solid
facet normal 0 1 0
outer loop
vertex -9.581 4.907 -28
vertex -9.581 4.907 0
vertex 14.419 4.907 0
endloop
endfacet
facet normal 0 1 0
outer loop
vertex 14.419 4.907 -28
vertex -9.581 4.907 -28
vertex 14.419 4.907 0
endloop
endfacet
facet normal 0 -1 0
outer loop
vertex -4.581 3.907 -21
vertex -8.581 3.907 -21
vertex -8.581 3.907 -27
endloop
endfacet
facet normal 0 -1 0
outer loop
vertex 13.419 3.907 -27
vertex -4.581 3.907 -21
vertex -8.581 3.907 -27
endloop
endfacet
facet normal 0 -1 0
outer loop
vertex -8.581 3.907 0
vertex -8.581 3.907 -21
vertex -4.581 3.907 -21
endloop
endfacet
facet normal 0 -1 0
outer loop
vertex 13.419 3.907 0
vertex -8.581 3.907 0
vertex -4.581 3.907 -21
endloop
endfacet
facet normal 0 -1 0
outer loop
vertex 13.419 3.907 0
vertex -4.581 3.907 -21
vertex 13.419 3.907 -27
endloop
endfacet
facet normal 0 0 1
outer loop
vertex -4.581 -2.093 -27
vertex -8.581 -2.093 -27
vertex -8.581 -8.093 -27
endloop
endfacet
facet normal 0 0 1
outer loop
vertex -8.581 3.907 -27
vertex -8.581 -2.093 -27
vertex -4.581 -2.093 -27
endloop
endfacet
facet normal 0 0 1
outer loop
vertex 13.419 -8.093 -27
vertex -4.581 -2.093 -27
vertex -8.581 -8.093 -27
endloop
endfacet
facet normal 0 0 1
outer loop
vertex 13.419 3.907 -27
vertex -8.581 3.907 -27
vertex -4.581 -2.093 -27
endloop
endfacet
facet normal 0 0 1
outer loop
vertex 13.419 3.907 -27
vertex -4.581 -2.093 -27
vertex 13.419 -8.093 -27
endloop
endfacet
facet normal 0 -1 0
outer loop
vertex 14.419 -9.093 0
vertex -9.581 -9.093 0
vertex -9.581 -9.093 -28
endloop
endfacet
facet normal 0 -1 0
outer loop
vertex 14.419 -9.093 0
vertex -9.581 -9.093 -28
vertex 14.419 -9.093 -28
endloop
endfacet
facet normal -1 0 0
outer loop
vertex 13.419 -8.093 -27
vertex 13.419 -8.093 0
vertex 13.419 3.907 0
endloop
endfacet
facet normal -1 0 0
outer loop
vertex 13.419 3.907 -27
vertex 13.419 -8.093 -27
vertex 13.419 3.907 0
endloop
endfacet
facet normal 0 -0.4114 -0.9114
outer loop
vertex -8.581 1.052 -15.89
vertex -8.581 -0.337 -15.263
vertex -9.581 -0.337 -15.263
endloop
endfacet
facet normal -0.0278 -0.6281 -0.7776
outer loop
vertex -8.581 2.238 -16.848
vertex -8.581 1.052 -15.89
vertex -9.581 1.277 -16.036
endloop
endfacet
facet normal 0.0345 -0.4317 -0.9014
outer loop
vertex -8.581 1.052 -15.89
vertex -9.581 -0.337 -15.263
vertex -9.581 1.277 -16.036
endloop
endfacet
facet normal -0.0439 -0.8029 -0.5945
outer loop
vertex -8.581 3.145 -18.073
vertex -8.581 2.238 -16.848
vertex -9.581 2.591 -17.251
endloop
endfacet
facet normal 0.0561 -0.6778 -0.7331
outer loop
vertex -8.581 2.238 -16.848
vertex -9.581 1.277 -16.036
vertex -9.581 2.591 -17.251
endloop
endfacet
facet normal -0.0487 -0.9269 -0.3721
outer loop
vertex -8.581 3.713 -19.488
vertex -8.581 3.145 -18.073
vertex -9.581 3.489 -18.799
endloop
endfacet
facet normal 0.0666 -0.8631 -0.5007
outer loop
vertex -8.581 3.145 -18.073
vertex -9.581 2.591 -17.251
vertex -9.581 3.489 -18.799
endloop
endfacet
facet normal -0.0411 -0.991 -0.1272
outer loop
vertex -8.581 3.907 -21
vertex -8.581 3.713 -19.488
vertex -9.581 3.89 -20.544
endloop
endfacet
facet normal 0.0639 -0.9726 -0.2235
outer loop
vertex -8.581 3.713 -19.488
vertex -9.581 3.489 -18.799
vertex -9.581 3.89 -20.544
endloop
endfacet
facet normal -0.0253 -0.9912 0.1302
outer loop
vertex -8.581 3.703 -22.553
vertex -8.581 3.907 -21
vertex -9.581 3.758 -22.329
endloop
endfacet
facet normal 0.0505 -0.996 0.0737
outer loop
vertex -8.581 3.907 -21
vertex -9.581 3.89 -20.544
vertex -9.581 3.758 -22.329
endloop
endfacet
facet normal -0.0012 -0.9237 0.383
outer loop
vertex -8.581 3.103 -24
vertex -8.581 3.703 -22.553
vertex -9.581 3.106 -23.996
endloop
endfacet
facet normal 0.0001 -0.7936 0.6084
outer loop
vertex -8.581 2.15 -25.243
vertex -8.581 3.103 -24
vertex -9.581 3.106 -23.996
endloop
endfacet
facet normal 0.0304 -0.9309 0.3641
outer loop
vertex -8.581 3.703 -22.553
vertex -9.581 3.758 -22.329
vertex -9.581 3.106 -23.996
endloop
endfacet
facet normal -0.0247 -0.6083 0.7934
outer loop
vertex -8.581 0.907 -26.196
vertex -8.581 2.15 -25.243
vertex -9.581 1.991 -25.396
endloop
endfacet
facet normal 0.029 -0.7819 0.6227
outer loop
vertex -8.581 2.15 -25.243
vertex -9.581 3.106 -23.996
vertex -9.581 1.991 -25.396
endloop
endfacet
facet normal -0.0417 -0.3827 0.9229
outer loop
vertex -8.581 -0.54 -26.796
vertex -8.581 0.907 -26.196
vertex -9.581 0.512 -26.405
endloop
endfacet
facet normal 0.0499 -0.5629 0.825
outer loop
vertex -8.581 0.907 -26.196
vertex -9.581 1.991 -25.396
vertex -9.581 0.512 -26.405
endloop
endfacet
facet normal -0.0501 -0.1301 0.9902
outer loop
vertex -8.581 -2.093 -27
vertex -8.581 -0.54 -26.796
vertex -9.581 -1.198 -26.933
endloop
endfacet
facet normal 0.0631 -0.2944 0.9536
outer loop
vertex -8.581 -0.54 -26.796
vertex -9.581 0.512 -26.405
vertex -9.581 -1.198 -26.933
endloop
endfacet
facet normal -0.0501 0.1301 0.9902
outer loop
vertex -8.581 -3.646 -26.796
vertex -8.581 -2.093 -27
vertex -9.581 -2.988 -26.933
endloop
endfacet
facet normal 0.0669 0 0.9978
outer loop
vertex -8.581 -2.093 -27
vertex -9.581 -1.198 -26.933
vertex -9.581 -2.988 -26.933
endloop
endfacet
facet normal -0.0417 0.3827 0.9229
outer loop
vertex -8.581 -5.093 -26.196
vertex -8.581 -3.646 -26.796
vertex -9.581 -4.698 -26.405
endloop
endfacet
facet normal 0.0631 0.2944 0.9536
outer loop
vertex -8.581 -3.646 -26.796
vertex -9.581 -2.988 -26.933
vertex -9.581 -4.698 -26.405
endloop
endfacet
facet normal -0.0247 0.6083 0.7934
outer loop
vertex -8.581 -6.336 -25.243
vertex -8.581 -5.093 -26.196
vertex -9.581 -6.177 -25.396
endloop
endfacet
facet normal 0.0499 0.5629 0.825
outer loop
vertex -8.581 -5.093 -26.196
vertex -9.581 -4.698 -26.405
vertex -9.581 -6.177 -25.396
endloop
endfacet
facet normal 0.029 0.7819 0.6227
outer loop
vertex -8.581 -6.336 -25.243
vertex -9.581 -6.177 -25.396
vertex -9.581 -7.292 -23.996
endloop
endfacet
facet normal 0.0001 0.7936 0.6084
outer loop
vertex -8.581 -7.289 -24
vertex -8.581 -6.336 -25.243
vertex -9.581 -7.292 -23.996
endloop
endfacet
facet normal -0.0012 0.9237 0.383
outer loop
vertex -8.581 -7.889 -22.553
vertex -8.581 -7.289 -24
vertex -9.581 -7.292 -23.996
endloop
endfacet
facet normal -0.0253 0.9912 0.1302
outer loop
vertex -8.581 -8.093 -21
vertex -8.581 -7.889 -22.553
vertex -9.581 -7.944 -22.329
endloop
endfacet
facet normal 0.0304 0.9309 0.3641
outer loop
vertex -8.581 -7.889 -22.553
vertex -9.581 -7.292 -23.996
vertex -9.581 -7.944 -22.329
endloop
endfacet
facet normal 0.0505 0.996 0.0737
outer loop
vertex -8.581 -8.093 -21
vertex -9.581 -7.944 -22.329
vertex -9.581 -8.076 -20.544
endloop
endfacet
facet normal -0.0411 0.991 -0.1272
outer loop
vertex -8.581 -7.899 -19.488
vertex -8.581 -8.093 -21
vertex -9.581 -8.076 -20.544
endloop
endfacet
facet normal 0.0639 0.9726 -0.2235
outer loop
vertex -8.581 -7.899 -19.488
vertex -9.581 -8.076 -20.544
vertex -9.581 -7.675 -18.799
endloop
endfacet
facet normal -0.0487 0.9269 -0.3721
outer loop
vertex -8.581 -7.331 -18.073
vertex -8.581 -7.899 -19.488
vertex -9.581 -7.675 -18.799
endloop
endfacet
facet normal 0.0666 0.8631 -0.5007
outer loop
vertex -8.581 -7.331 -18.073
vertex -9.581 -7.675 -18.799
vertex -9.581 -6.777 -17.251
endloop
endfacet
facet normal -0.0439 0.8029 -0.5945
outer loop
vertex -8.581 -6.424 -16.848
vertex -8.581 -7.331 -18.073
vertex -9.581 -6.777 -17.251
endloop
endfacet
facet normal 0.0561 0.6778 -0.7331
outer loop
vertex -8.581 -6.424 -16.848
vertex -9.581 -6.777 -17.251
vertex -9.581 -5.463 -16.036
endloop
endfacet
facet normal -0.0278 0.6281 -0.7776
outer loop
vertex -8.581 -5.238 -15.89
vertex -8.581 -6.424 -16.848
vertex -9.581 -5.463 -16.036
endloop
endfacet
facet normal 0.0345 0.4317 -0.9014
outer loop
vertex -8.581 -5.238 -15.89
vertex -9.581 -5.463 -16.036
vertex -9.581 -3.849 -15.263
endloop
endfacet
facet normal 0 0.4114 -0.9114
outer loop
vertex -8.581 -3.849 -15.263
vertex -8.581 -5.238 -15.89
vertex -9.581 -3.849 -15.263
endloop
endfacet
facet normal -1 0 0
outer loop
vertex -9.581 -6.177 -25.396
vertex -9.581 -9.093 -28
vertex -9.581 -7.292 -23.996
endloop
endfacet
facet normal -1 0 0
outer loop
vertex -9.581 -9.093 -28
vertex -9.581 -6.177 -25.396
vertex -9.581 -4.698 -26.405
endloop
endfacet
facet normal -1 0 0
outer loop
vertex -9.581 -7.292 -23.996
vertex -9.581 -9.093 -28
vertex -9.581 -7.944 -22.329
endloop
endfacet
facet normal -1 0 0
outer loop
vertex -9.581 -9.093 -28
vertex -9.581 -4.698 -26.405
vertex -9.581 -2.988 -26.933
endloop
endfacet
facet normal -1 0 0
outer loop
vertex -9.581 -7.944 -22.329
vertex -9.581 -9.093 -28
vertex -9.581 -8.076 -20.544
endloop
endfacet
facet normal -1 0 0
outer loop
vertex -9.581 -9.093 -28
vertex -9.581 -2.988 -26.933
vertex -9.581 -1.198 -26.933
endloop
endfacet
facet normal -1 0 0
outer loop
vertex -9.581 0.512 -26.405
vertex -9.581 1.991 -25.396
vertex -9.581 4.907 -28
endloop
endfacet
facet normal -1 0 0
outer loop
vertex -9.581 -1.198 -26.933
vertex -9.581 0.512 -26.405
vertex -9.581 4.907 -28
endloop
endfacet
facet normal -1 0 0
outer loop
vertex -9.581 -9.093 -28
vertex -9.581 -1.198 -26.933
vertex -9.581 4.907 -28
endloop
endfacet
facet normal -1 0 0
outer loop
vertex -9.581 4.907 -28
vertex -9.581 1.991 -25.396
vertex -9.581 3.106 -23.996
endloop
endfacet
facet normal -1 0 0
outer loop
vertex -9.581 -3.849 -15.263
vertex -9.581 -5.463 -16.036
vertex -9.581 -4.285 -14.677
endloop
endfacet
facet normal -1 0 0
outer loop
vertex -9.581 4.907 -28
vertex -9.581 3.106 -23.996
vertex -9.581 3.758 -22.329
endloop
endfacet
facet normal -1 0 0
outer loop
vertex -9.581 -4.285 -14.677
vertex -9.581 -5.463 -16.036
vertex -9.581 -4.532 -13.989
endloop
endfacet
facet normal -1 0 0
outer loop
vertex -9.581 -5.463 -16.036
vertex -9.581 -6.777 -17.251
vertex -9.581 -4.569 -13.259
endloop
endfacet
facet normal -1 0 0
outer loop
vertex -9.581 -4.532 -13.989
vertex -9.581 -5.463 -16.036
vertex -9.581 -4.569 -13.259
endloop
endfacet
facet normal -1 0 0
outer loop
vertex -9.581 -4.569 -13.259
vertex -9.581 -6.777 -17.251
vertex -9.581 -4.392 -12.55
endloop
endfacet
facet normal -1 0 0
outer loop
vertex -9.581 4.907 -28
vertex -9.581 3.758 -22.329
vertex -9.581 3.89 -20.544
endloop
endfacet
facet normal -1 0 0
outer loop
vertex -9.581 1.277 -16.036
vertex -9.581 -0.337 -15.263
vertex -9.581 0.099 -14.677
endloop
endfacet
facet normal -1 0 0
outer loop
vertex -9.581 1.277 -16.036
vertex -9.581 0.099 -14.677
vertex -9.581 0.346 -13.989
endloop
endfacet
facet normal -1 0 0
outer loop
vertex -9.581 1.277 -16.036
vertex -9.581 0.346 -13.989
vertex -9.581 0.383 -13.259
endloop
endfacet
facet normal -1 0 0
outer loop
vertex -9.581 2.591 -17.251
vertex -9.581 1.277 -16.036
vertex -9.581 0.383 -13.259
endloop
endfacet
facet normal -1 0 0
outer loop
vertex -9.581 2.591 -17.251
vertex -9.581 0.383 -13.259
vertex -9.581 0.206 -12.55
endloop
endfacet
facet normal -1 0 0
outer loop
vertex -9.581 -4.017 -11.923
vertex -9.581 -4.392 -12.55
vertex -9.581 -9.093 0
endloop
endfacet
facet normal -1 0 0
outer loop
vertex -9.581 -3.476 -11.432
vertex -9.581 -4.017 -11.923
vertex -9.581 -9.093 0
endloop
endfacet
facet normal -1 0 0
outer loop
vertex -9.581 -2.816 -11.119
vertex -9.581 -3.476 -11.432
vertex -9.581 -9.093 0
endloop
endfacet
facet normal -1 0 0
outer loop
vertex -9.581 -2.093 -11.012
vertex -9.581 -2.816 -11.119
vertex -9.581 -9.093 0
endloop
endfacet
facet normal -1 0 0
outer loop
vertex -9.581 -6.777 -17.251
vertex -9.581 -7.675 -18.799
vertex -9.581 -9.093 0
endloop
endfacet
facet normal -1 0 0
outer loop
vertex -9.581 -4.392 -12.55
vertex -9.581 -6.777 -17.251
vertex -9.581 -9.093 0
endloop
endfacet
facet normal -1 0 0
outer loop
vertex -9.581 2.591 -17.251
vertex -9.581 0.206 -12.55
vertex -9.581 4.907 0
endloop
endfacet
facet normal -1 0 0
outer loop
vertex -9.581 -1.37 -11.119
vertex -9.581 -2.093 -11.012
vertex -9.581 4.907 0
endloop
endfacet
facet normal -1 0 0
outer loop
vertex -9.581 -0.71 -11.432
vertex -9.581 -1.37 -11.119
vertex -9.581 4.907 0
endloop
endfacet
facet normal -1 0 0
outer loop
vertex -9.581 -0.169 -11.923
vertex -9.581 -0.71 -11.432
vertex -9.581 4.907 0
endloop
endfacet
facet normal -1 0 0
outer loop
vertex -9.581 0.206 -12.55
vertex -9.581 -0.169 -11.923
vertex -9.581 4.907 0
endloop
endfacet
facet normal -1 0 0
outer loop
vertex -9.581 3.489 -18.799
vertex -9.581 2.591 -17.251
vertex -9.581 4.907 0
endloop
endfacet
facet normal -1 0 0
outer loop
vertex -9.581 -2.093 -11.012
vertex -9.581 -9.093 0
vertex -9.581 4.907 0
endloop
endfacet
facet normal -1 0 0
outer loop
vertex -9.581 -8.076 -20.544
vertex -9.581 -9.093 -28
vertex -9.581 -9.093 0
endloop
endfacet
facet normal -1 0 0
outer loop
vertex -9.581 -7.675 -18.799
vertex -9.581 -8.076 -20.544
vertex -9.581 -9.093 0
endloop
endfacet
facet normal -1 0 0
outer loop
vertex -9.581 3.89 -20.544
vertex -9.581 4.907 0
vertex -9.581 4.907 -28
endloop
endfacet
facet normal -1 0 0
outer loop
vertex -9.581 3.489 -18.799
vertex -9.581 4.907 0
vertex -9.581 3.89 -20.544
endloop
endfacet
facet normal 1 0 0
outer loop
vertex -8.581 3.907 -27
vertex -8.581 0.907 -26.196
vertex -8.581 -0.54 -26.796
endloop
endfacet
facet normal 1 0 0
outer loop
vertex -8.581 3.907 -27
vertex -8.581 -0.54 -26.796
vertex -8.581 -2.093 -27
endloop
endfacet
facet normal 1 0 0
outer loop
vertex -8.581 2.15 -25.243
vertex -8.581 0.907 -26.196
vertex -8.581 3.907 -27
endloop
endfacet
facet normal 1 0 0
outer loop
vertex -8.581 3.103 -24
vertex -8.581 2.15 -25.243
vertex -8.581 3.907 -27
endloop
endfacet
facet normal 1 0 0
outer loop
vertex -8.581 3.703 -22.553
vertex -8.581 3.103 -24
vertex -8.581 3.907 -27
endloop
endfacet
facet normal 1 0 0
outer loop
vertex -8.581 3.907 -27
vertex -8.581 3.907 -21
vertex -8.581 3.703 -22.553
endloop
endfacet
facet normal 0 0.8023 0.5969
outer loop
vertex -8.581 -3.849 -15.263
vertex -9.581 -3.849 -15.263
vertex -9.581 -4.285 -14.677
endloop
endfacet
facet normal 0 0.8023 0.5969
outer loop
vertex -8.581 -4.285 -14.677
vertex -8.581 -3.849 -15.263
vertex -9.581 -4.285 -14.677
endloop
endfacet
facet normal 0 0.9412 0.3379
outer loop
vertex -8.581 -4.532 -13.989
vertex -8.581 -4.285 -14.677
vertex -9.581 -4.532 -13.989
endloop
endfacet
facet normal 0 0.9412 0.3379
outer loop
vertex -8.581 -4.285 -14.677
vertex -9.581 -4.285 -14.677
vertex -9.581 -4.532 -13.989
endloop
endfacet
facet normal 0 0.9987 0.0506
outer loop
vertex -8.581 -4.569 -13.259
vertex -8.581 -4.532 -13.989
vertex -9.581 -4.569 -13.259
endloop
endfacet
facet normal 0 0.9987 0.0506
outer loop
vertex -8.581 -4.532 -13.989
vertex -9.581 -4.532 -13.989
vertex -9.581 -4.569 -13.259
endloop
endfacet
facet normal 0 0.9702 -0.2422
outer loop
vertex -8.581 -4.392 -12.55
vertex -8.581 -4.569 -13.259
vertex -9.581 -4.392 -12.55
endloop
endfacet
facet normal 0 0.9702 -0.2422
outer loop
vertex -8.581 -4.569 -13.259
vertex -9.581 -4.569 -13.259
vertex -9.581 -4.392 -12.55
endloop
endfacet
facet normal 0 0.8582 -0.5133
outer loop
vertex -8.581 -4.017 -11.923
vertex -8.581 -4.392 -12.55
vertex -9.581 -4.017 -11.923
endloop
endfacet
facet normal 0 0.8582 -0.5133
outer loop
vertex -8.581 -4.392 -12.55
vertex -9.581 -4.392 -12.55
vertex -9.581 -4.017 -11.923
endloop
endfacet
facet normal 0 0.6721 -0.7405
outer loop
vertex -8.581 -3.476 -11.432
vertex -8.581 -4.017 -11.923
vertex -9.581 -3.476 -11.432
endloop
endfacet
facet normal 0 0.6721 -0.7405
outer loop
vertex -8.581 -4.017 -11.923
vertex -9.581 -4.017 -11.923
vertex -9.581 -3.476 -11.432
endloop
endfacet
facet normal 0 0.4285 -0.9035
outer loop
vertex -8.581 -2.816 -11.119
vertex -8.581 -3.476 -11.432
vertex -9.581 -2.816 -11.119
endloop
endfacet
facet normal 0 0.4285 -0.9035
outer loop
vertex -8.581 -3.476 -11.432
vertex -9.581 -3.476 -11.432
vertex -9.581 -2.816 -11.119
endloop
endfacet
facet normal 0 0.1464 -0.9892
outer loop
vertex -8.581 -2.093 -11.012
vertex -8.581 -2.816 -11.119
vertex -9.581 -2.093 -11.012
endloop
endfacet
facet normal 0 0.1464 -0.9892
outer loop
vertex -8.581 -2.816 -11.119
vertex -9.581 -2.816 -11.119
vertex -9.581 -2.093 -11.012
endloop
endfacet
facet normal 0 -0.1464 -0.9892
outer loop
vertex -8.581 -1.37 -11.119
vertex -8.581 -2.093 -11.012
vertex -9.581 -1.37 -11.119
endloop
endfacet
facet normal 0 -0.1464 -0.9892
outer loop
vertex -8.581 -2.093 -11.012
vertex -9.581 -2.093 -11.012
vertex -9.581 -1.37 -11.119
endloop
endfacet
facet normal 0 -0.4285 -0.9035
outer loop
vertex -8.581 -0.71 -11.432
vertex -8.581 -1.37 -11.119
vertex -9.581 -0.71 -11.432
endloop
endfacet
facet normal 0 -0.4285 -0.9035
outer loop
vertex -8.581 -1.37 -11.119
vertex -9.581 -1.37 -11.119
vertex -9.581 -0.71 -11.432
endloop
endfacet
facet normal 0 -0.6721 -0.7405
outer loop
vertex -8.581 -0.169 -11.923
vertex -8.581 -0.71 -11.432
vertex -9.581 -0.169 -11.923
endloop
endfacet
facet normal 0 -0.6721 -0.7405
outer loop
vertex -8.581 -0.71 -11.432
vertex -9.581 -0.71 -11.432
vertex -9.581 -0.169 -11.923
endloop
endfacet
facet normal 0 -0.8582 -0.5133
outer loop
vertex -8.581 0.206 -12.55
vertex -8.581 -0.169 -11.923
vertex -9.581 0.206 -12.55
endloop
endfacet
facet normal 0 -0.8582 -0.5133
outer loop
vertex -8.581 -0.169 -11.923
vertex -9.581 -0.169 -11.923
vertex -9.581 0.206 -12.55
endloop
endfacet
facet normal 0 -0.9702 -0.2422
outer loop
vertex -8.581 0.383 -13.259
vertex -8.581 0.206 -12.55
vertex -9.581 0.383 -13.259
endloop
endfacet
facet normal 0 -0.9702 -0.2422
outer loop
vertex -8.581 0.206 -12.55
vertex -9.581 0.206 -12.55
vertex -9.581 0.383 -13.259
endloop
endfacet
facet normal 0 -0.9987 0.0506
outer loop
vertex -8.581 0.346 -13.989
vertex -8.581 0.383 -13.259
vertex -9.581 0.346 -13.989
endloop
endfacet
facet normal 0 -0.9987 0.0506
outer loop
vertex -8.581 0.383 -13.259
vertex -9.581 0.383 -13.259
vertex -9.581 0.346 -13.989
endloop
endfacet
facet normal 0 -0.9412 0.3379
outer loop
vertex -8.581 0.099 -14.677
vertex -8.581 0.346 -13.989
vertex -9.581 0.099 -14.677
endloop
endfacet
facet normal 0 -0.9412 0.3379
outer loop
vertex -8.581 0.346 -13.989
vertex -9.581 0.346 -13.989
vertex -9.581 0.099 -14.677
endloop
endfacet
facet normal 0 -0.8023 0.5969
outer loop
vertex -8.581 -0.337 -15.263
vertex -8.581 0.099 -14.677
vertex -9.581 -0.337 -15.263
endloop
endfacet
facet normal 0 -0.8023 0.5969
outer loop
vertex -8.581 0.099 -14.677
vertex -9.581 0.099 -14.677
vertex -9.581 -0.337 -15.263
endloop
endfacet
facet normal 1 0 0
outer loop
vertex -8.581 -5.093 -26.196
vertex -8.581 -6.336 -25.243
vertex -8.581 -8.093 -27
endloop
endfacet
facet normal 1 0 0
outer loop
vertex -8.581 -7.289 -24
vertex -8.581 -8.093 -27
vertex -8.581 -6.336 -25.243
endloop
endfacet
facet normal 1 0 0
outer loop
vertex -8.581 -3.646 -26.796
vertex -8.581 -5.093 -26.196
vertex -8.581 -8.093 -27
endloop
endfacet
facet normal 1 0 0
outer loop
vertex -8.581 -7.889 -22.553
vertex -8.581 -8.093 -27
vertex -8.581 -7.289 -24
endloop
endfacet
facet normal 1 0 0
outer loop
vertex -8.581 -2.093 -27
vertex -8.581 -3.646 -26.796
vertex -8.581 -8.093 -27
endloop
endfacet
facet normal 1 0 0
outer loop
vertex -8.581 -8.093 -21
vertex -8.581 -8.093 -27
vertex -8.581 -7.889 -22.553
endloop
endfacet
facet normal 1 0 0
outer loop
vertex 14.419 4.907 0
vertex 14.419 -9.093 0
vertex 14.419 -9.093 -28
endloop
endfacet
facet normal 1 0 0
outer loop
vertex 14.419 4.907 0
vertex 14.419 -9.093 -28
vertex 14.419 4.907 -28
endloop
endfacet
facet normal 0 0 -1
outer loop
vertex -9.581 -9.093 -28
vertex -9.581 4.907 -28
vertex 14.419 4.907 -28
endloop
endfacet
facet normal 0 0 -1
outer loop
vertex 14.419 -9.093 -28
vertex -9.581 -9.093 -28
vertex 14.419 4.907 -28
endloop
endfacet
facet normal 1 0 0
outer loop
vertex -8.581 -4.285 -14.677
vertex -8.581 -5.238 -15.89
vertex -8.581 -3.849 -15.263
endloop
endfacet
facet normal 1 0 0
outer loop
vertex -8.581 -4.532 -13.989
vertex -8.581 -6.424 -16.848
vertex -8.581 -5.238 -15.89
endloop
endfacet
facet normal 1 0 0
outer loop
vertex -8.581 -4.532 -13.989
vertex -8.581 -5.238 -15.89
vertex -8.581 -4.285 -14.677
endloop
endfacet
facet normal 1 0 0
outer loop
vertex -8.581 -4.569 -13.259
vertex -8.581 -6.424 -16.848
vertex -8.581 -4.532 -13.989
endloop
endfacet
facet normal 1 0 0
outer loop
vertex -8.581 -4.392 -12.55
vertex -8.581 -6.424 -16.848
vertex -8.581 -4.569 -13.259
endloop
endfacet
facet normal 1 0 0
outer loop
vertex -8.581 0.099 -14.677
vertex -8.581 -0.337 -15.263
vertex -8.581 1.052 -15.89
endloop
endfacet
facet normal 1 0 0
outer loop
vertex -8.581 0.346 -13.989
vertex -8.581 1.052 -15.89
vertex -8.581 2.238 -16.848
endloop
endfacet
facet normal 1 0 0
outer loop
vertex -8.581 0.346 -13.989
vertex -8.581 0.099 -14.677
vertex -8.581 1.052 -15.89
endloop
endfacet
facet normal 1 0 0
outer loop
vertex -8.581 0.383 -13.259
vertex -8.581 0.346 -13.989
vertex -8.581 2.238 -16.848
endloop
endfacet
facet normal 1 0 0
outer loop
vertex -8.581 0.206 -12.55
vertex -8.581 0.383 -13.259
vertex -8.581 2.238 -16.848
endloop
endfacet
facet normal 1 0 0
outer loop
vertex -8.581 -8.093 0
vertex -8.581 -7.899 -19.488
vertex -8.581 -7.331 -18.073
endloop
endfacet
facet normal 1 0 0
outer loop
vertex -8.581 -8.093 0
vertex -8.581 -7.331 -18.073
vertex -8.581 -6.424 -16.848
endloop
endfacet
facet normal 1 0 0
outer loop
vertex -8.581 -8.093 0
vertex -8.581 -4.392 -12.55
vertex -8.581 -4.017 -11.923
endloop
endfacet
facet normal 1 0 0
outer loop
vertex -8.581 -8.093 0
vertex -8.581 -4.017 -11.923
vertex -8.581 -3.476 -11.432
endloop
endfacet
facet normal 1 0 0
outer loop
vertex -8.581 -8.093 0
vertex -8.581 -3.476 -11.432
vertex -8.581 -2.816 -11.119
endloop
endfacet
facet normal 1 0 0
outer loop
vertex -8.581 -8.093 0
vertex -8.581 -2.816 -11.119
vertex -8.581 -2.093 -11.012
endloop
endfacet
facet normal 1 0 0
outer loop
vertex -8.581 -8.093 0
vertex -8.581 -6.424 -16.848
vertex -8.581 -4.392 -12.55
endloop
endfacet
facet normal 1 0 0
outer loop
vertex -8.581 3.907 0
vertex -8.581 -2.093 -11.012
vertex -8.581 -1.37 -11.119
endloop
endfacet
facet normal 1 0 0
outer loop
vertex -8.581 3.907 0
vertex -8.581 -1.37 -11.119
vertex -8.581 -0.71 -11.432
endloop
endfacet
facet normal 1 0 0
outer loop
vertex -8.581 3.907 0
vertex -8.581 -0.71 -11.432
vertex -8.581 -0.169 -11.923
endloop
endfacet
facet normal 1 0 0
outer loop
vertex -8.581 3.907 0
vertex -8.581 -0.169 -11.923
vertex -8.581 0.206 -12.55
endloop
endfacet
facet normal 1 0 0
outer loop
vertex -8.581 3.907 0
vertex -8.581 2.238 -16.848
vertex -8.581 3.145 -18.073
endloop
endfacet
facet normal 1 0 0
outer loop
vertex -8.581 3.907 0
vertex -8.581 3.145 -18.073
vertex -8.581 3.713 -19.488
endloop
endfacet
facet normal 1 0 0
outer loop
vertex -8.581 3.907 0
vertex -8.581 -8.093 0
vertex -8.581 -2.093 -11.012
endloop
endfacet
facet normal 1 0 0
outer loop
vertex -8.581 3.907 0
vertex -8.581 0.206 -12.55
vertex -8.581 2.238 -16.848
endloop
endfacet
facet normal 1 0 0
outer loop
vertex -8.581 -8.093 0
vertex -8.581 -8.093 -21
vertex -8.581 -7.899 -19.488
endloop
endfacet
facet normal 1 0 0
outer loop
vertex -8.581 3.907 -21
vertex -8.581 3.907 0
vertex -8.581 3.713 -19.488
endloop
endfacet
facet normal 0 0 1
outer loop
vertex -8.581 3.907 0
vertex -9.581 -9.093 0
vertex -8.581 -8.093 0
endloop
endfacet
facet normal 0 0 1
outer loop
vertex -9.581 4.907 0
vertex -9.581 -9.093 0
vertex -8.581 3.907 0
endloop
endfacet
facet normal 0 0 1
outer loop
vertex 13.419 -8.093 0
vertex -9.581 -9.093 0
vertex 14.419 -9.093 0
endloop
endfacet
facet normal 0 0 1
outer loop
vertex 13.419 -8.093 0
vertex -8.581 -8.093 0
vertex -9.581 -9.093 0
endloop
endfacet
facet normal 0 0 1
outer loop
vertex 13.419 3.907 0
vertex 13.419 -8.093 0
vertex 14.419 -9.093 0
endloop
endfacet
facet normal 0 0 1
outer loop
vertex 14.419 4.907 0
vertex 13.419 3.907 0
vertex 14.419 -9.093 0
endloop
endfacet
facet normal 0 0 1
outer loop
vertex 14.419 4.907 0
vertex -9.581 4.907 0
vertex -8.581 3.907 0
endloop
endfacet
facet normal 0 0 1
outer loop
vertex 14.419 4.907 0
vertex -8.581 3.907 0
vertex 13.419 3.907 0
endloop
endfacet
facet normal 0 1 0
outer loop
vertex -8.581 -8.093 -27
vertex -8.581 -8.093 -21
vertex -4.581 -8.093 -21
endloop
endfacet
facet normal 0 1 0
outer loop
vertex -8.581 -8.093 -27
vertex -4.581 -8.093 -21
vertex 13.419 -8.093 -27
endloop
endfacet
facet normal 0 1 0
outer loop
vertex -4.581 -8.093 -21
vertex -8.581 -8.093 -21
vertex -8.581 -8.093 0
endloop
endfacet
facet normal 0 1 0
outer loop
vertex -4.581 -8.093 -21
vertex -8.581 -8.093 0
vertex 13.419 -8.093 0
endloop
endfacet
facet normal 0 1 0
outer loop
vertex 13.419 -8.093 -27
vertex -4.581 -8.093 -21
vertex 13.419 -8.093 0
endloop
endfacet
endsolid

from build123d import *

# Parameters (mm, degrees)
SKETCH1_W           = 24
SKETCH1_H           = 14
BOSS_EXTRUDE4_DEPTH = 28
SKETCH3_W           = 22
SKETCH3_H           = 12
CUT_EXTRUDE1_DEPTH  = 27
SKETCH4_R           = 6
SKETCH4_R_2         = 2.487873036
CUT_EXTRUDE7_DEPTH  = 5


with BuildPart() as part:
    # Sketch1 → Boss-Extrude4 (new body)
    with BuildSketch(Plane.XY):
        with Locations((2.418604651, -2.093023256)):
            Rectangle(SKETCH1_W, SKETCH1_H)
    extrude(amount=-BOSS_EXTRUDE4_DEPTH)

    # Sketch3 → Cut-Extrude1 (cut)
    with BuildSketch(Plane.XY):
        with Locations((2.418604651, -2.093023256)):
            Rectangle(SKETCH3_W, SKETCH3_H)
    extrude(amount=-CUT_EXTRUDE1_DEPTH, mode=Mode.SUBTRACT)

    # Sketch4 → Cut-Extrude7 (cut)
    with BuildSketch(Plane.ZY.offset(9.581395349)):
        with Locations((-21, -2.093023256)):
            Circle(SKETCH4_R)
        with Locations((-13.5, -2.093023256)):
            Circle(SKETCH4_R_2)
    extrude(amount=-CUT_EXTRUDE7_DEPTH, mode=Mode.SUBTRACT)


solid = part.part
